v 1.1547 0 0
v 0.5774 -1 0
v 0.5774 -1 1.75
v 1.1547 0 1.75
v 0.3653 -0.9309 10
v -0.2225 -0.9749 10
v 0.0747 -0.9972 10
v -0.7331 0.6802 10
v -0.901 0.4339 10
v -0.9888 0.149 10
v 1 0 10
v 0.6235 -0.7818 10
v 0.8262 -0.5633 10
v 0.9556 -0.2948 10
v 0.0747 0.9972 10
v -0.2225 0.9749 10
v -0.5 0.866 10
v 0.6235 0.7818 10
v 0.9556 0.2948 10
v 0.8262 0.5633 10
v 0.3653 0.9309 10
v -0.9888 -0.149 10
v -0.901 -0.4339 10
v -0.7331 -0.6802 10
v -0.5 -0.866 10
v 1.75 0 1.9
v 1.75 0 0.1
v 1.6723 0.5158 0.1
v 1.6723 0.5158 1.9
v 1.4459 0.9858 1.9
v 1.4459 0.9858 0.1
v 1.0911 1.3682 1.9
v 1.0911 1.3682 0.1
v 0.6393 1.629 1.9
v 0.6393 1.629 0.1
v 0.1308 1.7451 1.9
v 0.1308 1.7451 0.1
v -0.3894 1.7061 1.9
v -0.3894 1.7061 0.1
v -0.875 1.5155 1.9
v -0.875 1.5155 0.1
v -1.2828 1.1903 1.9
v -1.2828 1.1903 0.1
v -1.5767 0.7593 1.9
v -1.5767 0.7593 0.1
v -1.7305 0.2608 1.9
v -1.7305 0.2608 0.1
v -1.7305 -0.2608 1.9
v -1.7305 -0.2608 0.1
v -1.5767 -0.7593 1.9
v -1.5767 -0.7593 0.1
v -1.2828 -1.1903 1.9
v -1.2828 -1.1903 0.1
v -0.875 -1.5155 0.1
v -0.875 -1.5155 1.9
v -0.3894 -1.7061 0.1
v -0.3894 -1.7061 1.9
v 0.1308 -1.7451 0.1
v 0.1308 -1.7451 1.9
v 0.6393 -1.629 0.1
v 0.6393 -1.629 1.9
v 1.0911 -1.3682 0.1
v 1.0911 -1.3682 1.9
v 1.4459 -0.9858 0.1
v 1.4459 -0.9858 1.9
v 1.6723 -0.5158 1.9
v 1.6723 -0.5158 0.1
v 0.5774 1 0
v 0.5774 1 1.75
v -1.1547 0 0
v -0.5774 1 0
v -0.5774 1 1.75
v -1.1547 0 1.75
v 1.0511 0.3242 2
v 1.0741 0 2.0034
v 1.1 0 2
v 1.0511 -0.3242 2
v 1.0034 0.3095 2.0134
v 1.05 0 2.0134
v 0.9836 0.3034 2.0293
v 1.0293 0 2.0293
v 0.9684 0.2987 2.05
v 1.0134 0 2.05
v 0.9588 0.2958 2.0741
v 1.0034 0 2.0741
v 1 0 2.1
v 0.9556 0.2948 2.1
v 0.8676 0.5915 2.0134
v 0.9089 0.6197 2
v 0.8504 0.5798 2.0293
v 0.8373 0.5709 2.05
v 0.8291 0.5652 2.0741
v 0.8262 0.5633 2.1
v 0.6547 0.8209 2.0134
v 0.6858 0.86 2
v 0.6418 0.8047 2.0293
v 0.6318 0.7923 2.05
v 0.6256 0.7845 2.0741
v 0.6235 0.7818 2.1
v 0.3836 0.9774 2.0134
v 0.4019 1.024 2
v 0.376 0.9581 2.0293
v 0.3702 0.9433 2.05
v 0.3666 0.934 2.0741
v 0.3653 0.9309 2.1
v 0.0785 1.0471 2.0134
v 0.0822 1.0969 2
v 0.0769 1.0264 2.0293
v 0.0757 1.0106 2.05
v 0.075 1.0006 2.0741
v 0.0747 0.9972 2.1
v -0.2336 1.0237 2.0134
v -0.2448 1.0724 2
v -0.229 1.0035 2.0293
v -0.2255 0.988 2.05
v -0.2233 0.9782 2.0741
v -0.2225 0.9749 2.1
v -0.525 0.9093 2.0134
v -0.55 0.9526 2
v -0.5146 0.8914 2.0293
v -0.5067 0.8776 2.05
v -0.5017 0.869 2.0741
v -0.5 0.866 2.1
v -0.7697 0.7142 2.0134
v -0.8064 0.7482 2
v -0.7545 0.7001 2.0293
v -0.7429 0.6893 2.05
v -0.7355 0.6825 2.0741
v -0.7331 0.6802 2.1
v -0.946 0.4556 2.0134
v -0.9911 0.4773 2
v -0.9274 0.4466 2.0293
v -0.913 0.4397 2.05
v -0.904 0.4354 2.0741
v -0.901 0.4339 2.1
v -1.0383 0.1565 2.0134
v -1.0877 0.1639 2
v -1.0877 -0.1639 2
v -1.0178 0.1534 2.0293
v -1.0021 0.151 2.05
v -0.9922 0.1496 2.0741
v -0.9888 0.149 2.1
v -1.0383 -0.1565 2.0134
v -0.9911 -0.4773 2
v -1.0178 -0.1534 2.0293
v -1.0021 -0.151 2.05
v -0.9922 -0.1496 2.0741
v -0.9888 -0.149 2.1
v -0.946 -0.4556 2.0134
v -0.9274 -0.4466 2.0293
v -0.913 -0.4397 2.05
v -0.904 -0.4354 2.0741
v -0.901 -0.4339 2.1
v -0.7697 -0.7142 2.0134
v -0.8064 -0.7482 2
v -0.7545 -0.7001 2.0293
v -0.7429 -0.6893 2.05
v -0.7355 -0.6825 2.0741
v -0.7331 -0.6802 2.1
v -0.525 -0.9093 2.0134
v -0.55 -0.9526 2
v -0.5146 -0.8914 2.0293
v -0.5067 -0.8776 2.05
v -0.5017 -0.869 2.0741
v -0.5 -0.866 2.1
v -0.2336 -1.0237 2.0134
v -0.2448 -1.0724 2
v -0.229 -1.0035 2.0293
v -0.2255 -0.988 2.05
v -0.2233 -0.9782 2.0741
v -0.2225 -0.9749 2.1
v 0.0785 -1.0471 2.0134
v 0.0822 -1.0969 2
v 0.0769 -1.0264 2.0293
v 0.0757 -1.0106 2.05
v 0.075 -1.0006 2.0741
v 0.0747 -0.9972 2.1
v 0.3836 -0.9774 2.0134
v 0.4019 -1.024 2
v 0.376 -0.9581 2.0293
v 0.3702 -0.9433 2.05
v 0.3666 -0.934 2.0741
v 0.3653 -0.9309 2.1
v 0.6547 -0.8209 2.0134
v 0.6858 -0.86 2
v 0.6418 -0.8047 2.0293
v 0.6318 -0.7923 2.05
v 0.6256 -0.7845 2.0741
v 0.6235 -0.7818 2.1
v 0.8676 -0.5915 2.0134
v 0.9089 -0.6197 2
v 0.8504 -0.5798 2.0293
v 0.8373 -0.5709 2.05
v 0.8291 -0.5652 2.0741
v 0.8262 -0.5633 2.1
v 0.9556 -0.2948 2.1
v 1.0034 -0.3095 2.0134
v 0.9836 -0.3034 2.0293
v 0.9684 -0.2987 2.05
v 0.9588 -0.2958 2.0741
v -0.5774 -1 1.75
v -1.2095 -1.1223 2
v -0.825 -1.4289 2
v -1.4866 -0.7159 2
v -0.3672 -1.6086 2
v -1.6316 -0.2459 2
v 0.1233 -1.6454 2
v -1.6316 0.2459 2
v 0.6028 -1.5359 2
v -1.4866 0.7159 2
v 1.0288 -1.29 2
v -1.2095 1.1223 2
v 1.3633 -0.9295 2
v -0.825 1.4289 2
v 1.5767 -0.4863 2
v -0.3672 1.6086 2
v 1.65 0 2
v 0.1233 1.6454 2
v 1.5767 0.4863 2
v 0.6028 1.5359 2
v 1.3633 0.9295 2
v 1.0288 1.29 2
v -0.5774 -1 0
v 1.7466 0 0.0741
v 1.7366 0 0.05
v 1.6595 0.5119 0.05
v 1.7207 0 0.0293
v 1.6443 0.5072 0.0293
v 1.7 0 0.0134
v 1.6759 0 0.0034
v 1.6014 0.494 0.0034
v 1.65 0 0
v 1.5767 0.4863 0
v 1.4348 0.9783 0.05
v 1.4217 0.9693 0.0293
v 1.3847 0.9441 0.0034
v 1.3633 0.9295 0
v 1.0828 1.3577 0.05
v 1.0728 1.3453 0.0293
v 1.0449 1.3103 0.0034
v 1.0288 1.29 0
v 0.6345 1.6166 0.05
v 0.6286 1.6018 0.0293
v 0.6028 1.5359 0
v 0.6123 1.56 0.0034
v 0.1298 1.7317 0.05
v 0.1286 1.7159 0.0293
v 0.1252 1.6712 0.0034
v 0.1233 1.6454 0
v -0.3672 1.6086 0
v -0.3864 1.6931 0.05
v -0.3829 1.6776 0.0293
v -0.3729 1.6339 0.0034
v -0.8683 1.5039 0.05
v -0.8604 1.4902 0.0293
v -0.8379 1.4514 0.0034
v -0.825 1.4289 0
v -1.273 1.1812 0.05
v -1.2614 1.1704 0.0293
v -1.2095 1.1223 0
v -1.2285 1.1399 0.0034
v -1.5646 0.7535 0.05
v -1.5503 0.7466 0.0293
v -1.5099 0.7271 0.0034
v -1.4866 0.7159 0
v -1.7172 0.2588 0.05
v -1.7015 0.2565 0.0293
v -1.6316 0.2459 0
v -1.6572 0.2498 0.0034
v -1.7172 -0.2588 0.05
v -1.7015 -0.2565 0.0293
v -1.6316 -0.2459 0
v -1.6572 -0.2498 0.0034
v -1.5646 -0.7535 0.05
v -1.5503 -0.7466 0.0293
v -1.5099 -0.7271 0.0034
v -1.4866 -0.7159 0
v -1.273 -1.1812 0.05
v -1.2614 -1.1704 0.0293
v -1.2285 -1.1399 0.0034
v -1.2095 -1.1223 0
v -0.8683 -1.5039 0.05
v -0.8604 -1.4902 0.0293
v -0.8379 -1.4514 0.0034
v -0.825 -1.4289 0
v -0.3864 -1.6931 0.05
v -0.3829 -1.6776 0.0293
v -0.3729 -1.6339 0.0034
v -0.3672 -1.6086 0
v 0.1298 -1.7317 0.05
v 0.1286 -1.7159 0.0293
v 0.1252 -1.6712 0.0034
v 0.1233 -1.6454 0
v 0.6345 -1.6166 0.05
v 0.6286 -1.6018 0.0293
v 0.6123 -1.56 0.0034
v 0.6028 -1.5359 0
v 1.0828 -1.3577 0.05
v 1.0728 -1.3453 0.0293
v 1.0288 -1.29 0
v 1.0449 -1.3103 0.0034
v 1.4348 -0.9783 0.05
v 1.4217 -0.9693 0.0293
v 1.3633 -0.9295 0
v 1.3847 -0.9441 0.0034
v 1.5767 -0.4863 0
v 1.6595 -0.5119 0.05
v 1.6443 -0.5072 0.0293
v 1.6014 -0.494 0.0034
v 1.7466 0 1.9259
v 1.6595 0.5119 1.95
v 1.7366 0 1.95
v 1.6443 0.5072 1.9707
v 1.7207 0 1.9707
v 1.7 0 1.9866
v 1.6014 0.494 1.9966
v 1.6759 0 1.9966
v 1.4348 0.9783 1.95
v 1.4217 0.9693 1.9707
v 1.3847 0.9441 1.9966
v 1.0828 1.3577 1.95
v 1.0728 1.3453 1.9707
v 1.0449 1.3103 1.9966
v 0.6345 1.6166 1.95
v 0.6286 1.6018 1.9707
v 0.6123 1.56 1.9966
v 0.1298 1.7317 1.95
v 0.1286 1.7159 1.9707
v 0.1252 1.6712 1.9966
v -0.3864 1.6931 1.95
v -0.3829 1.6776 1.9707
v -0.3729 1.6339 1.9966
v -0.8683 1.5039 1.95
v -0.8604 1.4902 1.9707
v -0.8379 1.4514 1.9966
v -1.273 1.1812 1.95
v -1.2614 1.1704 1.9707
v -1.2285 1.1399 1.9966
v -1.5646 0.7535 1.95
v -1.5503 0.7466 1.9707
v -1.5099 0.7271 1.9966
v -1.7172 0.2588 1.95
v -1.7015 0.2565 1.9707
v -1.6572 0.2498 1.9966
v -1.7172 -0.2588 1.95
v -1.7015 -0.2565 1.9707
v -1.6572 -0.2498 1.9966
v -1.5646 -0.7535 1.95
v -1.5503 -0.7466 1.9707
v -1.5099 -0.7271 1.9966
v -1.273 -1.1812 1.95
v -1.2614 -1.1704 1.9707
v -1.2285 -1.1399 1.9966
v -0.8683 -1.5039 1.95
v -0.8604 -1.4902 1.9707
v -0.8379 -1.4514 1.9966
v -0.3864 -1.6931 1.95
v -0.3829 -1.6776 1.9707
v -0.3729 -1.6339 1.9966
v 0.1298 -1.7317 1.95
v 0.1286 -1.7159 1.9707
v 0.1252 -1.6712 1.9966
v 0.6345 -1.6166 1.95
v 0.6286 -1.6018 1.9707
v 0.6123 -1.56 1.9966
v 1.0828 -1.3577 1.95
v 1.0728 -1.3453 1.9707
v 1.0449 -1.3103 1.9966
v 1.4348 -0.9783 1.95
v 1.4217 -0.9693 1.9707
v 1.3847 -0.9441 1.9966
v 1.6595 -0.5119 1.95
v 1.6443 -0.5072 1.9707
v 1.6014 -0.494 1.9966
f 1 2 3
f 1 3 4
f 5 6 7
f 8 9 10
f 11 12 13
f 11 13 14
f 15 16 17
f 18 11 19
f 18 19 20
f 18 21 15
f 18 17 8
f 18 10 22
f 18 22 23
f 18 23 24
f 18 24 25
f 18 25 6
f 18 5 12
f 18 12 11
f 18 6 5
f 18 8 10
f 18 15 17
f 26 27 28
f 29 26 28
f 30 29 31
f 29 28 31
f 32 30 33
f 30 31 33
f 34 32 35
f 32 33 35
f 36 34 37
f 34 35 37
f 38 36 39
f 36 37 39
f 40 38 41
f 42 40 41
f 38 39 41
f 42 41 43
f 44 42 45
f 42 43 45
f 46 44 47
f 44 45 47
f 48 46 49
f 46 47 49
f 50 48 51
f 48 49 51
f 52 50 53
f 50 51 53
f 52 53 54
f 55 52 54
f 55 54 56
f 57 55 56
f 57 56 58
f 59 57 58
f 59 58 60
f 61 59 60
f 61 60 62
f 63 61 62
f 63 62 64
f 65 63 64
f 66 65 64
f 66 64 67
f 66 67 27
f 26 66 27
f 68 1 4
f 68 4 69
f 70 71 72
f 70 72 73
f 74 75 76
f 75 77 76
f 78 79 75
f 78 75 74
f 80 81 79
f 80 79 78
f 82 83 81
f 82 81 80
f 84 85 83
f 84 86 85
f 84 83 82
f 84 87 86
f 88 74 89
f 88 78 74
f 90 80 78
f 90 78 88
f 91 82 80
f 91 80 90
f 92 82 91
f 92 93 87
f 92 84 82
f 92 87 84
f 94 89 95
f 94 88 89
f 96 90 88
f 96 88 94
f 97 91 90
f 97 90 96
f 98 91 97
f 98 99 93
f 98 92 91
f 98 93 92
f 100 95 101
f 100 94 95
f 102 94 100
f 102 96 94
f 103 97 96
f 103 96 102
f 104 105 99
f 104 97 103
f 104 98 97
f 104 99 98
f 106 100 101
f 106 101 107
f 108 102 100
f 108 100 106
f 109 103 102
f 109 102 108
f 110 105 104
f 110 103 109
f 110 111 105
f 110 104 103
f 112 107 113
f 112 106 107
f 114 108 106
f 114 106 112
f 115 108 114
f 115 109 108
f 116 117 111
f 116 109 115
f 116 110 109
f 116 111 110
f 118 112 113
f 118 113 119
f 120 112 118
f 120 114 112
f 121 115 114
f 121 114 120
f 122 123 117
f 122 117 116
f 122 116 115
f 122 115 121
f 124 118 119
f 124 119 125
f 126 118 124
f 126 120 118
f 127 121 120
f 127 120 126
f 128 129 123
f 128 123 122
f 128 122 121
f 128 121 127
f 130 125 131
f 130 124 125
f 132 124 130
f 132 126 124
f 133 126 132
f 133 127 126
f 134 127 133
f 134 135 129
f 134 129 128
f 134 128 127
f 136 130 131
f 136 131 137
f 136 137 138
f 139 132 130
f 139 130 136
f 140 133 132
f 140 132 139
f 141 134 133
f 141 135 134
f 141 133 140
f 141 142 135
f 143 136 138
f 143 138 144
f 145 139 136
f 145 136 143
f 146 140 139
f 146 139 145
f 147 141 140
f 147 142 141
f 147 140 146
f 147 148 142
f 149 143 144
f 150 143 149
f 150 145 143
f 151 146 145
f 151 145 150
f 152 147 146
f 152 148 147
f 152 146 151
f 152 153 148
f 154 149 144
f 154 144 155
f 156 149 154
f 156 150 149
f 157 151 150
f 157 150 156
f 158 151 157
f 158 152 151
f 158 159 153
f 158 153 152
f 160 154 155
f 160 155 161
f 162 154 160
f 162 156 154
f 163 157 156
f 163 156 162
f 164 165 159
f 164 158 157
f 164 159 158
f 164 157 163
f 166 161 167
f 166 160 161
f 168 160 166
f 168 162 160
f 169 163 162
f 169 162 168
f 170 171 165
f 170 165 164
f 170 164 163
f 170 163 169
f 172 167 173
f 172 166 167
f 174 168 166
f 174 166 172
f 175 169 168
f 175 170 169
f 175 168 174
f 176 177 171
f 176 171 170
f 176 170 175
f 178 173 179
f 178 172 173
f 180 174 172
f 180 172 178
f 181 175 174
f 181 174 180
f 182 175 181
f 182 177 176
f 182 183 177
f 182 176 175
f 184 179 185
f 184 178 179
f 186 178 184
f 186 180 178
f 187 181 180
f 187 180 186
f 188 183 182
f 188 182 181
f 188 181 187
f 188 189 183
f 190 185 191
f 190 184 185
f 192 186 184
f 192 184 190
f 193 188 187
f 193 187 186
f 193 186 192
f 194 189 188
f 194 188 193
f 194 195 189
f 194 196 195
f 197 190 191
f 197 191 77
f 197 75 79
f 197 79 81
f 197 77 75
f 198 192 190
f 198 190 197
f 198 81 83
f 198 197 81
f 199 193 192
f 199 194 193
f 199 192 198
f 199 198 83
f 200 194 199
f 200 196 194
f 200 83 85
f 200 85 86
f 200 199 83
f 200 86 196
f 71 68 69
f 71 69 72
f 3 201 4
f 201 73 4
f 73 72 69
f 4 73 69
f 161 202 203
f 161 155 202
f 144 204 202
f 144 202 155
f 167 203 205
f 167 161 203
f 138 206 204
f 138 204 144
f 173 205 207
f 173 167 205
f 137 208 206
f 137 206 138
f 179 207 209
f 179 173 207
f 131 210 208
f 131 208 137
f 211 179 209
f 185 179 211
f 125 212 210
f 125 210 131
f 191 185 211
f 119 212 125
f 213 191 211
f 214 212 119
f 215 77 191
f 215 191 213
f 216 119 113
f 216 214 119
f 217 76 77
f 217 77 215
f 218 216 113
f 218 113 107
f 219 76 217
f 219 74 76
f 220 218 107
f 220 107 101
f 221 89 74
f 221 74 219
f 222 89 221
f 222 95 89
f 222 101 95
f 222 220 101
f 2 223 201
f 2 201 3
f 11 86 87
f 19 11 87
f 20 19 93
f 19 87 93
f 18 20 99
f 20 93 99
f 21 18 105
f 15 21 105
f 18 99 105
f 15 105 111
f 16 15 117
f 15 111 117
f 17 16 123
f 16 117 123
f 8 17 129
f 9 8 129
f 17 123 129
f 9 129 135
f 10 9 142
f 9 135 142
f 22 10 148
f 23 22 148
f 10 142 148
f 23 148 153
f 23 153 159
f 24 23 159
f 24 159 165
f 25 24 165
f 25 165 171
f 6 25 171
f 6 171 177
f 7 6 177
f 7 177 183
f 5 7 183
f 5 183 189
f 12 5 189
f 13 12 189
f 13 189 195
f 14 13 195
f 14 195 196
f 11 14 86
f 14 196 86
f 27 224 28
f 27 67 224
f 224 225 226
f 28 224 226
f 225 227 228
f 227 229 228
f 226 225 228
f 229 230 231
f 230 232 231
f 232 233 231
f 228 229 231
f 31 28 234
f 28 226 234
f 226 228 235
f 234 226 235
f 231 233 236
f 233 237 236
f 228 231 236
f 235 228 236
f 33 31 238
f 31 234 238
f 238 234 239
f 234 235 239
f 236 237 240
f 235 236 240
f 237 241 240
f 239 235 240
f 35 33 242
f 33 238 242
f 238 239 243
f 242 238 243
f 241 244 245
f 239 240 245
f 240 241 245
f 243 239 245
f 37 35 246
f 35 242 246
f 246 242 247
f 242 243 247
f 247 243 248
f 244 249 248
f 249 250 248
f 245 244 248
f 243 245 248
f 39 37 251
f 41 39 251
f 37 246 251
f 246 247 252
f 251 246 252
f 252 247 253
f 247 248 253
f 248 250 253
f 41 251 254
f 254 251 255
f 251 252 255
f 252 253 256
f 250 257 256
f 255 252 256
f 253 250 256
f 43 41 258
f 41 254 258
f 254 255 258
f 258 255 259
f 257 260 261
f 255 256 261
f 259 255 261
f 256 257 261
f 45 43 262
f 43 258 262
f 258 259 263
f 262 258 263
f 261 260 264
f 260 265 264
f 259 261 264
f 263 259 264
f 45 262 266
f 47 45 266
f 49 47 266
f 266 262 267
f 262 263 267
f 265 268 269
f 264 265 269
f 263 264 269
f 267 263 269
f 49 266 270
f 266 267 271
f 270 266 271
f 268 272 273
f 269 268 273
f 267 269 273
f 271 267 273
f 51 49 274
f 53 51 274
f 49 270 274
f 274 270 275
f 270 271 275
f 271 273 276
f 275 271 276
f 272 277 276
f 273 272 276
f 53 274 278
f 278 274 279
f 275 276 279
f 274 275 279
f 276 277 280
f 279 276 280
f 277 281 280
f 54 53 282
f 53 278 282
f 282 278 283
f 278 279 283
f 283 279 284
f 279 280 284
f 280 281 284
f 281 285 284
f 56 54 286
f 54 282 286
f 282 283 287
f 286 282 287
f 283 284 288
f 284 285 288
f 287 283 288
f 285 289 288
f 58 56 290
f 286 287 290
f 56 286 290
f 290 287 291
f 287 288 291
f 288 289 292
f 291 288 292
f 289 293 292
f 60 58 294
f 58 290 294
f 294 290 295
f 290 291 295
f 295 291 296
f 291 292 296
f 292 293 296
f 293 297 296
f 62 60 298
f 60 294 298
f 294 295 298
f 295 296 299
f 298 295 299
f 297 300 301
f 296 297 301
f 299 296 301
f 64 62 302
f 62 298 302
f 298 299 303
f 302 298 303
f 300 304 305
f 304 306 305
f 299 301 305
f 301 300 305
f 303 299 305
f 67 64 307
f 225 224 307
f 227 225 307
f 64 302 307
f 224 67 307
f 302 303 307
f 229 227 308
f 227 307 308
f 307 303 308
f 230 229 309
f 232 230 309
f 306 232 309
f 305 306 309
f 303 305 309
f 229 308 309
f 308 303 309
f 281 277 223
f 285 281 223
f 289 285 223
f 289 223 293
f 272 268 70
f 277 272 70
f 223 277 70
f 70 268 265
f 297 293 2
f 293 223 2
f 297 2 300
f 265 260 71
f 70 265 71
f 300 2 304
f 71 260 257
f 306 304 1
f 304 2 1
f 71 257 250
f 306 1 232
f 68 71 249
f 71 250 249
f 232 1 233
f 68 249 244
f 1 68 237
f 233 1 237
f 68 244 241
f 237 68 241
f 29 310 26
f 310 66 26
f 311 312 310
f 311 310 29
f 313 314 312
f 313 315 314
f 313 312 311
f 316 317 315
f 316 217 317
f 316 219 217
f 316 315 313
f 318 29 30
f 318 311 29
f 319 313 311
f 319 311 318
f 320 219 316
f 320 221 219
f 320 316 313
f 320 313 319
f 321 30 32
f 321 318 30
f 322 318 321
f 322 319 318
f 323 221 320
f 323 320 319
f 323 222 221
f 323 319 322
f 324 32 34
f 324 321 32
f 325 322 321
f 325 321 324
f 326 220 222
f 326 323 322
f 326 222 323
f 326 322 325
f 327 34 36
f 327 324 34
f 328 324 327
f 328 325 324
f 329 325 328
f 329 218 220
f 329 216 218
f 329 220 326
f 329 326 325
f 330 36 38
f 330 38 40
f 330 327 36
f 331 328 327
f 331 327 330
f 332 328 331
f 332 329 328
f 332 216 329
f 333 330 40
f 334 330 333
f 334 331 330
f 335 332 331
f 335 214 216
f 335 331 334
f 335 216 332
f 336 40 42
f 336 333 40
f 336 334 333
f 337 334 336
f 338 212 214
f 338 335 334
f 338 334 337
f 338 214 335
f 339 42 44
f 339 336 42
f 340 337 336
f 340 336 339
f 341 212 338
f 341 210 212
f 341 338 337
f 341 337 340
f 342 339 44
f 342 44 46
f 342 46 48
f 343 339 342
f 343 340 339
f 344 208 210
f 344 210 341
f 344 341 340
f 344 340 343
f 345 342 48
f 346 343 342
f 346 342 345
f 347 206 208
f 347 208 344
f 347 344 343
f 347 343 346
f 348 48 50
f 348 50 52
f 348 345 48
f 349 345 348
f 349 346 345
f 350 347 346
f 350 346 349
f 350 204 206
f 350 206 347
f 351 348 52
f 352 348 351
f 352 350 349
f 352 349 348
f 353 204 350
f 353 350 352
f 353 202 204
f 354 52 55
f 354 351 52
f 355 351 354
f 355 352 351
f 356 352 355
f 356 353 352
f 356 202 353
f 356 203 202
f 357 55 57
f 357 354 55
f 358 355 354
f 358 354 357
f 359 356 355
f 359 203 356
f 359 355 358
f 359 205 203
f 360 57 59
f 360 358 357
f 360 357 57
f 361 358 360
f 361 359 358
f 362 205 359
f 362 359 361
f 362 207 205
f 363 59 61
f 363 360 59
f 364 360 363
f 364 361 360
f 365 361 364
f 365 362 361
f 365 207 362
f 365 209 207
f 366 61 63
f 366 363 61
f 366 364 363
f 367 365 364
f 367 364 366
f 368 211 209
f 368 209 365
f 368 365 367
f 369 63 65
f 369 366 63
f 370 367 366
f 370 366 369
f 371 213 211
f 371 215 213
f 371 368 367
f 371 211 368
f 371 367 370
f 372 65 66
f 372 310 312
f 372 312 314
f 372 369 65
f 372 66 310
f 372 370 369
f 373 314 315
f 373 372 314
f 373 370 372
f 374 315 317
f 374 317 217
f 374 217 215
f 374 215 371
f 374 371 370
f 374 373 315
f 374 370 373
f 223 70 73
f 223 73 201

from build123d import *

# Parameters (mm, degrees)
ESQUISSE1_R        = 1.75
BOSS_EXTRU_1_DEPTH = 2
BOSS_EXTRU_2_START = -0.25
ESQUISSE3_R        = 1.75
BOSS_EXTRU_2_DEPTH = 0.25
ESQUISSE2_R        = 1
BOSS_EXTRU_3_DEPTH = 8
CONG_1_R           = 0.1


with BuildPart() as part:
    # Esquisse1 → Boss.-Extru.1 (new body)
    with BuildSketch(Plane.XY):
        Circle(ESQUISSE1_R)
        Polygon((0.577350269, -1), (1.154700538, 0), (0.577350269, 1), (-0.577350269, 1), (-1.154700538, 0), (-0.577350269, -1), align=None, mode=Mode.SUBTRACT)
    extrude(amount=BOSS_EXTRU_1_DEPTH)

    # Esquisse3 → Boss.-Extru.2 (add)
    with BuildSketch(Plane.XY.offset(2).offset(BOSS_EXTRU_2_START)):
        Circle(ESQUISSE3_R)
    extrude(amount=BOSS_EXTRU_2_DEPTH)

    # Esquisse2 → Boss.-Extru.3 (add)
    with BuildSketch(Plane.XY.offset(2)):
        Circle(ESQUISSE2_R)
    extrude(amount=BOSS_EXTRU_3_DEPTH)

    # Congé1
    cong_1_edges = [part.edges().sort_by_distance(p)[0] for p in [
        (-1.75, 0, 0),
        (-1, 0, 2),
        (-1.75, 0, 2),
    ]]
    fillet(cong_1_edges, radius=CONG_1_R)


solid = part.part
